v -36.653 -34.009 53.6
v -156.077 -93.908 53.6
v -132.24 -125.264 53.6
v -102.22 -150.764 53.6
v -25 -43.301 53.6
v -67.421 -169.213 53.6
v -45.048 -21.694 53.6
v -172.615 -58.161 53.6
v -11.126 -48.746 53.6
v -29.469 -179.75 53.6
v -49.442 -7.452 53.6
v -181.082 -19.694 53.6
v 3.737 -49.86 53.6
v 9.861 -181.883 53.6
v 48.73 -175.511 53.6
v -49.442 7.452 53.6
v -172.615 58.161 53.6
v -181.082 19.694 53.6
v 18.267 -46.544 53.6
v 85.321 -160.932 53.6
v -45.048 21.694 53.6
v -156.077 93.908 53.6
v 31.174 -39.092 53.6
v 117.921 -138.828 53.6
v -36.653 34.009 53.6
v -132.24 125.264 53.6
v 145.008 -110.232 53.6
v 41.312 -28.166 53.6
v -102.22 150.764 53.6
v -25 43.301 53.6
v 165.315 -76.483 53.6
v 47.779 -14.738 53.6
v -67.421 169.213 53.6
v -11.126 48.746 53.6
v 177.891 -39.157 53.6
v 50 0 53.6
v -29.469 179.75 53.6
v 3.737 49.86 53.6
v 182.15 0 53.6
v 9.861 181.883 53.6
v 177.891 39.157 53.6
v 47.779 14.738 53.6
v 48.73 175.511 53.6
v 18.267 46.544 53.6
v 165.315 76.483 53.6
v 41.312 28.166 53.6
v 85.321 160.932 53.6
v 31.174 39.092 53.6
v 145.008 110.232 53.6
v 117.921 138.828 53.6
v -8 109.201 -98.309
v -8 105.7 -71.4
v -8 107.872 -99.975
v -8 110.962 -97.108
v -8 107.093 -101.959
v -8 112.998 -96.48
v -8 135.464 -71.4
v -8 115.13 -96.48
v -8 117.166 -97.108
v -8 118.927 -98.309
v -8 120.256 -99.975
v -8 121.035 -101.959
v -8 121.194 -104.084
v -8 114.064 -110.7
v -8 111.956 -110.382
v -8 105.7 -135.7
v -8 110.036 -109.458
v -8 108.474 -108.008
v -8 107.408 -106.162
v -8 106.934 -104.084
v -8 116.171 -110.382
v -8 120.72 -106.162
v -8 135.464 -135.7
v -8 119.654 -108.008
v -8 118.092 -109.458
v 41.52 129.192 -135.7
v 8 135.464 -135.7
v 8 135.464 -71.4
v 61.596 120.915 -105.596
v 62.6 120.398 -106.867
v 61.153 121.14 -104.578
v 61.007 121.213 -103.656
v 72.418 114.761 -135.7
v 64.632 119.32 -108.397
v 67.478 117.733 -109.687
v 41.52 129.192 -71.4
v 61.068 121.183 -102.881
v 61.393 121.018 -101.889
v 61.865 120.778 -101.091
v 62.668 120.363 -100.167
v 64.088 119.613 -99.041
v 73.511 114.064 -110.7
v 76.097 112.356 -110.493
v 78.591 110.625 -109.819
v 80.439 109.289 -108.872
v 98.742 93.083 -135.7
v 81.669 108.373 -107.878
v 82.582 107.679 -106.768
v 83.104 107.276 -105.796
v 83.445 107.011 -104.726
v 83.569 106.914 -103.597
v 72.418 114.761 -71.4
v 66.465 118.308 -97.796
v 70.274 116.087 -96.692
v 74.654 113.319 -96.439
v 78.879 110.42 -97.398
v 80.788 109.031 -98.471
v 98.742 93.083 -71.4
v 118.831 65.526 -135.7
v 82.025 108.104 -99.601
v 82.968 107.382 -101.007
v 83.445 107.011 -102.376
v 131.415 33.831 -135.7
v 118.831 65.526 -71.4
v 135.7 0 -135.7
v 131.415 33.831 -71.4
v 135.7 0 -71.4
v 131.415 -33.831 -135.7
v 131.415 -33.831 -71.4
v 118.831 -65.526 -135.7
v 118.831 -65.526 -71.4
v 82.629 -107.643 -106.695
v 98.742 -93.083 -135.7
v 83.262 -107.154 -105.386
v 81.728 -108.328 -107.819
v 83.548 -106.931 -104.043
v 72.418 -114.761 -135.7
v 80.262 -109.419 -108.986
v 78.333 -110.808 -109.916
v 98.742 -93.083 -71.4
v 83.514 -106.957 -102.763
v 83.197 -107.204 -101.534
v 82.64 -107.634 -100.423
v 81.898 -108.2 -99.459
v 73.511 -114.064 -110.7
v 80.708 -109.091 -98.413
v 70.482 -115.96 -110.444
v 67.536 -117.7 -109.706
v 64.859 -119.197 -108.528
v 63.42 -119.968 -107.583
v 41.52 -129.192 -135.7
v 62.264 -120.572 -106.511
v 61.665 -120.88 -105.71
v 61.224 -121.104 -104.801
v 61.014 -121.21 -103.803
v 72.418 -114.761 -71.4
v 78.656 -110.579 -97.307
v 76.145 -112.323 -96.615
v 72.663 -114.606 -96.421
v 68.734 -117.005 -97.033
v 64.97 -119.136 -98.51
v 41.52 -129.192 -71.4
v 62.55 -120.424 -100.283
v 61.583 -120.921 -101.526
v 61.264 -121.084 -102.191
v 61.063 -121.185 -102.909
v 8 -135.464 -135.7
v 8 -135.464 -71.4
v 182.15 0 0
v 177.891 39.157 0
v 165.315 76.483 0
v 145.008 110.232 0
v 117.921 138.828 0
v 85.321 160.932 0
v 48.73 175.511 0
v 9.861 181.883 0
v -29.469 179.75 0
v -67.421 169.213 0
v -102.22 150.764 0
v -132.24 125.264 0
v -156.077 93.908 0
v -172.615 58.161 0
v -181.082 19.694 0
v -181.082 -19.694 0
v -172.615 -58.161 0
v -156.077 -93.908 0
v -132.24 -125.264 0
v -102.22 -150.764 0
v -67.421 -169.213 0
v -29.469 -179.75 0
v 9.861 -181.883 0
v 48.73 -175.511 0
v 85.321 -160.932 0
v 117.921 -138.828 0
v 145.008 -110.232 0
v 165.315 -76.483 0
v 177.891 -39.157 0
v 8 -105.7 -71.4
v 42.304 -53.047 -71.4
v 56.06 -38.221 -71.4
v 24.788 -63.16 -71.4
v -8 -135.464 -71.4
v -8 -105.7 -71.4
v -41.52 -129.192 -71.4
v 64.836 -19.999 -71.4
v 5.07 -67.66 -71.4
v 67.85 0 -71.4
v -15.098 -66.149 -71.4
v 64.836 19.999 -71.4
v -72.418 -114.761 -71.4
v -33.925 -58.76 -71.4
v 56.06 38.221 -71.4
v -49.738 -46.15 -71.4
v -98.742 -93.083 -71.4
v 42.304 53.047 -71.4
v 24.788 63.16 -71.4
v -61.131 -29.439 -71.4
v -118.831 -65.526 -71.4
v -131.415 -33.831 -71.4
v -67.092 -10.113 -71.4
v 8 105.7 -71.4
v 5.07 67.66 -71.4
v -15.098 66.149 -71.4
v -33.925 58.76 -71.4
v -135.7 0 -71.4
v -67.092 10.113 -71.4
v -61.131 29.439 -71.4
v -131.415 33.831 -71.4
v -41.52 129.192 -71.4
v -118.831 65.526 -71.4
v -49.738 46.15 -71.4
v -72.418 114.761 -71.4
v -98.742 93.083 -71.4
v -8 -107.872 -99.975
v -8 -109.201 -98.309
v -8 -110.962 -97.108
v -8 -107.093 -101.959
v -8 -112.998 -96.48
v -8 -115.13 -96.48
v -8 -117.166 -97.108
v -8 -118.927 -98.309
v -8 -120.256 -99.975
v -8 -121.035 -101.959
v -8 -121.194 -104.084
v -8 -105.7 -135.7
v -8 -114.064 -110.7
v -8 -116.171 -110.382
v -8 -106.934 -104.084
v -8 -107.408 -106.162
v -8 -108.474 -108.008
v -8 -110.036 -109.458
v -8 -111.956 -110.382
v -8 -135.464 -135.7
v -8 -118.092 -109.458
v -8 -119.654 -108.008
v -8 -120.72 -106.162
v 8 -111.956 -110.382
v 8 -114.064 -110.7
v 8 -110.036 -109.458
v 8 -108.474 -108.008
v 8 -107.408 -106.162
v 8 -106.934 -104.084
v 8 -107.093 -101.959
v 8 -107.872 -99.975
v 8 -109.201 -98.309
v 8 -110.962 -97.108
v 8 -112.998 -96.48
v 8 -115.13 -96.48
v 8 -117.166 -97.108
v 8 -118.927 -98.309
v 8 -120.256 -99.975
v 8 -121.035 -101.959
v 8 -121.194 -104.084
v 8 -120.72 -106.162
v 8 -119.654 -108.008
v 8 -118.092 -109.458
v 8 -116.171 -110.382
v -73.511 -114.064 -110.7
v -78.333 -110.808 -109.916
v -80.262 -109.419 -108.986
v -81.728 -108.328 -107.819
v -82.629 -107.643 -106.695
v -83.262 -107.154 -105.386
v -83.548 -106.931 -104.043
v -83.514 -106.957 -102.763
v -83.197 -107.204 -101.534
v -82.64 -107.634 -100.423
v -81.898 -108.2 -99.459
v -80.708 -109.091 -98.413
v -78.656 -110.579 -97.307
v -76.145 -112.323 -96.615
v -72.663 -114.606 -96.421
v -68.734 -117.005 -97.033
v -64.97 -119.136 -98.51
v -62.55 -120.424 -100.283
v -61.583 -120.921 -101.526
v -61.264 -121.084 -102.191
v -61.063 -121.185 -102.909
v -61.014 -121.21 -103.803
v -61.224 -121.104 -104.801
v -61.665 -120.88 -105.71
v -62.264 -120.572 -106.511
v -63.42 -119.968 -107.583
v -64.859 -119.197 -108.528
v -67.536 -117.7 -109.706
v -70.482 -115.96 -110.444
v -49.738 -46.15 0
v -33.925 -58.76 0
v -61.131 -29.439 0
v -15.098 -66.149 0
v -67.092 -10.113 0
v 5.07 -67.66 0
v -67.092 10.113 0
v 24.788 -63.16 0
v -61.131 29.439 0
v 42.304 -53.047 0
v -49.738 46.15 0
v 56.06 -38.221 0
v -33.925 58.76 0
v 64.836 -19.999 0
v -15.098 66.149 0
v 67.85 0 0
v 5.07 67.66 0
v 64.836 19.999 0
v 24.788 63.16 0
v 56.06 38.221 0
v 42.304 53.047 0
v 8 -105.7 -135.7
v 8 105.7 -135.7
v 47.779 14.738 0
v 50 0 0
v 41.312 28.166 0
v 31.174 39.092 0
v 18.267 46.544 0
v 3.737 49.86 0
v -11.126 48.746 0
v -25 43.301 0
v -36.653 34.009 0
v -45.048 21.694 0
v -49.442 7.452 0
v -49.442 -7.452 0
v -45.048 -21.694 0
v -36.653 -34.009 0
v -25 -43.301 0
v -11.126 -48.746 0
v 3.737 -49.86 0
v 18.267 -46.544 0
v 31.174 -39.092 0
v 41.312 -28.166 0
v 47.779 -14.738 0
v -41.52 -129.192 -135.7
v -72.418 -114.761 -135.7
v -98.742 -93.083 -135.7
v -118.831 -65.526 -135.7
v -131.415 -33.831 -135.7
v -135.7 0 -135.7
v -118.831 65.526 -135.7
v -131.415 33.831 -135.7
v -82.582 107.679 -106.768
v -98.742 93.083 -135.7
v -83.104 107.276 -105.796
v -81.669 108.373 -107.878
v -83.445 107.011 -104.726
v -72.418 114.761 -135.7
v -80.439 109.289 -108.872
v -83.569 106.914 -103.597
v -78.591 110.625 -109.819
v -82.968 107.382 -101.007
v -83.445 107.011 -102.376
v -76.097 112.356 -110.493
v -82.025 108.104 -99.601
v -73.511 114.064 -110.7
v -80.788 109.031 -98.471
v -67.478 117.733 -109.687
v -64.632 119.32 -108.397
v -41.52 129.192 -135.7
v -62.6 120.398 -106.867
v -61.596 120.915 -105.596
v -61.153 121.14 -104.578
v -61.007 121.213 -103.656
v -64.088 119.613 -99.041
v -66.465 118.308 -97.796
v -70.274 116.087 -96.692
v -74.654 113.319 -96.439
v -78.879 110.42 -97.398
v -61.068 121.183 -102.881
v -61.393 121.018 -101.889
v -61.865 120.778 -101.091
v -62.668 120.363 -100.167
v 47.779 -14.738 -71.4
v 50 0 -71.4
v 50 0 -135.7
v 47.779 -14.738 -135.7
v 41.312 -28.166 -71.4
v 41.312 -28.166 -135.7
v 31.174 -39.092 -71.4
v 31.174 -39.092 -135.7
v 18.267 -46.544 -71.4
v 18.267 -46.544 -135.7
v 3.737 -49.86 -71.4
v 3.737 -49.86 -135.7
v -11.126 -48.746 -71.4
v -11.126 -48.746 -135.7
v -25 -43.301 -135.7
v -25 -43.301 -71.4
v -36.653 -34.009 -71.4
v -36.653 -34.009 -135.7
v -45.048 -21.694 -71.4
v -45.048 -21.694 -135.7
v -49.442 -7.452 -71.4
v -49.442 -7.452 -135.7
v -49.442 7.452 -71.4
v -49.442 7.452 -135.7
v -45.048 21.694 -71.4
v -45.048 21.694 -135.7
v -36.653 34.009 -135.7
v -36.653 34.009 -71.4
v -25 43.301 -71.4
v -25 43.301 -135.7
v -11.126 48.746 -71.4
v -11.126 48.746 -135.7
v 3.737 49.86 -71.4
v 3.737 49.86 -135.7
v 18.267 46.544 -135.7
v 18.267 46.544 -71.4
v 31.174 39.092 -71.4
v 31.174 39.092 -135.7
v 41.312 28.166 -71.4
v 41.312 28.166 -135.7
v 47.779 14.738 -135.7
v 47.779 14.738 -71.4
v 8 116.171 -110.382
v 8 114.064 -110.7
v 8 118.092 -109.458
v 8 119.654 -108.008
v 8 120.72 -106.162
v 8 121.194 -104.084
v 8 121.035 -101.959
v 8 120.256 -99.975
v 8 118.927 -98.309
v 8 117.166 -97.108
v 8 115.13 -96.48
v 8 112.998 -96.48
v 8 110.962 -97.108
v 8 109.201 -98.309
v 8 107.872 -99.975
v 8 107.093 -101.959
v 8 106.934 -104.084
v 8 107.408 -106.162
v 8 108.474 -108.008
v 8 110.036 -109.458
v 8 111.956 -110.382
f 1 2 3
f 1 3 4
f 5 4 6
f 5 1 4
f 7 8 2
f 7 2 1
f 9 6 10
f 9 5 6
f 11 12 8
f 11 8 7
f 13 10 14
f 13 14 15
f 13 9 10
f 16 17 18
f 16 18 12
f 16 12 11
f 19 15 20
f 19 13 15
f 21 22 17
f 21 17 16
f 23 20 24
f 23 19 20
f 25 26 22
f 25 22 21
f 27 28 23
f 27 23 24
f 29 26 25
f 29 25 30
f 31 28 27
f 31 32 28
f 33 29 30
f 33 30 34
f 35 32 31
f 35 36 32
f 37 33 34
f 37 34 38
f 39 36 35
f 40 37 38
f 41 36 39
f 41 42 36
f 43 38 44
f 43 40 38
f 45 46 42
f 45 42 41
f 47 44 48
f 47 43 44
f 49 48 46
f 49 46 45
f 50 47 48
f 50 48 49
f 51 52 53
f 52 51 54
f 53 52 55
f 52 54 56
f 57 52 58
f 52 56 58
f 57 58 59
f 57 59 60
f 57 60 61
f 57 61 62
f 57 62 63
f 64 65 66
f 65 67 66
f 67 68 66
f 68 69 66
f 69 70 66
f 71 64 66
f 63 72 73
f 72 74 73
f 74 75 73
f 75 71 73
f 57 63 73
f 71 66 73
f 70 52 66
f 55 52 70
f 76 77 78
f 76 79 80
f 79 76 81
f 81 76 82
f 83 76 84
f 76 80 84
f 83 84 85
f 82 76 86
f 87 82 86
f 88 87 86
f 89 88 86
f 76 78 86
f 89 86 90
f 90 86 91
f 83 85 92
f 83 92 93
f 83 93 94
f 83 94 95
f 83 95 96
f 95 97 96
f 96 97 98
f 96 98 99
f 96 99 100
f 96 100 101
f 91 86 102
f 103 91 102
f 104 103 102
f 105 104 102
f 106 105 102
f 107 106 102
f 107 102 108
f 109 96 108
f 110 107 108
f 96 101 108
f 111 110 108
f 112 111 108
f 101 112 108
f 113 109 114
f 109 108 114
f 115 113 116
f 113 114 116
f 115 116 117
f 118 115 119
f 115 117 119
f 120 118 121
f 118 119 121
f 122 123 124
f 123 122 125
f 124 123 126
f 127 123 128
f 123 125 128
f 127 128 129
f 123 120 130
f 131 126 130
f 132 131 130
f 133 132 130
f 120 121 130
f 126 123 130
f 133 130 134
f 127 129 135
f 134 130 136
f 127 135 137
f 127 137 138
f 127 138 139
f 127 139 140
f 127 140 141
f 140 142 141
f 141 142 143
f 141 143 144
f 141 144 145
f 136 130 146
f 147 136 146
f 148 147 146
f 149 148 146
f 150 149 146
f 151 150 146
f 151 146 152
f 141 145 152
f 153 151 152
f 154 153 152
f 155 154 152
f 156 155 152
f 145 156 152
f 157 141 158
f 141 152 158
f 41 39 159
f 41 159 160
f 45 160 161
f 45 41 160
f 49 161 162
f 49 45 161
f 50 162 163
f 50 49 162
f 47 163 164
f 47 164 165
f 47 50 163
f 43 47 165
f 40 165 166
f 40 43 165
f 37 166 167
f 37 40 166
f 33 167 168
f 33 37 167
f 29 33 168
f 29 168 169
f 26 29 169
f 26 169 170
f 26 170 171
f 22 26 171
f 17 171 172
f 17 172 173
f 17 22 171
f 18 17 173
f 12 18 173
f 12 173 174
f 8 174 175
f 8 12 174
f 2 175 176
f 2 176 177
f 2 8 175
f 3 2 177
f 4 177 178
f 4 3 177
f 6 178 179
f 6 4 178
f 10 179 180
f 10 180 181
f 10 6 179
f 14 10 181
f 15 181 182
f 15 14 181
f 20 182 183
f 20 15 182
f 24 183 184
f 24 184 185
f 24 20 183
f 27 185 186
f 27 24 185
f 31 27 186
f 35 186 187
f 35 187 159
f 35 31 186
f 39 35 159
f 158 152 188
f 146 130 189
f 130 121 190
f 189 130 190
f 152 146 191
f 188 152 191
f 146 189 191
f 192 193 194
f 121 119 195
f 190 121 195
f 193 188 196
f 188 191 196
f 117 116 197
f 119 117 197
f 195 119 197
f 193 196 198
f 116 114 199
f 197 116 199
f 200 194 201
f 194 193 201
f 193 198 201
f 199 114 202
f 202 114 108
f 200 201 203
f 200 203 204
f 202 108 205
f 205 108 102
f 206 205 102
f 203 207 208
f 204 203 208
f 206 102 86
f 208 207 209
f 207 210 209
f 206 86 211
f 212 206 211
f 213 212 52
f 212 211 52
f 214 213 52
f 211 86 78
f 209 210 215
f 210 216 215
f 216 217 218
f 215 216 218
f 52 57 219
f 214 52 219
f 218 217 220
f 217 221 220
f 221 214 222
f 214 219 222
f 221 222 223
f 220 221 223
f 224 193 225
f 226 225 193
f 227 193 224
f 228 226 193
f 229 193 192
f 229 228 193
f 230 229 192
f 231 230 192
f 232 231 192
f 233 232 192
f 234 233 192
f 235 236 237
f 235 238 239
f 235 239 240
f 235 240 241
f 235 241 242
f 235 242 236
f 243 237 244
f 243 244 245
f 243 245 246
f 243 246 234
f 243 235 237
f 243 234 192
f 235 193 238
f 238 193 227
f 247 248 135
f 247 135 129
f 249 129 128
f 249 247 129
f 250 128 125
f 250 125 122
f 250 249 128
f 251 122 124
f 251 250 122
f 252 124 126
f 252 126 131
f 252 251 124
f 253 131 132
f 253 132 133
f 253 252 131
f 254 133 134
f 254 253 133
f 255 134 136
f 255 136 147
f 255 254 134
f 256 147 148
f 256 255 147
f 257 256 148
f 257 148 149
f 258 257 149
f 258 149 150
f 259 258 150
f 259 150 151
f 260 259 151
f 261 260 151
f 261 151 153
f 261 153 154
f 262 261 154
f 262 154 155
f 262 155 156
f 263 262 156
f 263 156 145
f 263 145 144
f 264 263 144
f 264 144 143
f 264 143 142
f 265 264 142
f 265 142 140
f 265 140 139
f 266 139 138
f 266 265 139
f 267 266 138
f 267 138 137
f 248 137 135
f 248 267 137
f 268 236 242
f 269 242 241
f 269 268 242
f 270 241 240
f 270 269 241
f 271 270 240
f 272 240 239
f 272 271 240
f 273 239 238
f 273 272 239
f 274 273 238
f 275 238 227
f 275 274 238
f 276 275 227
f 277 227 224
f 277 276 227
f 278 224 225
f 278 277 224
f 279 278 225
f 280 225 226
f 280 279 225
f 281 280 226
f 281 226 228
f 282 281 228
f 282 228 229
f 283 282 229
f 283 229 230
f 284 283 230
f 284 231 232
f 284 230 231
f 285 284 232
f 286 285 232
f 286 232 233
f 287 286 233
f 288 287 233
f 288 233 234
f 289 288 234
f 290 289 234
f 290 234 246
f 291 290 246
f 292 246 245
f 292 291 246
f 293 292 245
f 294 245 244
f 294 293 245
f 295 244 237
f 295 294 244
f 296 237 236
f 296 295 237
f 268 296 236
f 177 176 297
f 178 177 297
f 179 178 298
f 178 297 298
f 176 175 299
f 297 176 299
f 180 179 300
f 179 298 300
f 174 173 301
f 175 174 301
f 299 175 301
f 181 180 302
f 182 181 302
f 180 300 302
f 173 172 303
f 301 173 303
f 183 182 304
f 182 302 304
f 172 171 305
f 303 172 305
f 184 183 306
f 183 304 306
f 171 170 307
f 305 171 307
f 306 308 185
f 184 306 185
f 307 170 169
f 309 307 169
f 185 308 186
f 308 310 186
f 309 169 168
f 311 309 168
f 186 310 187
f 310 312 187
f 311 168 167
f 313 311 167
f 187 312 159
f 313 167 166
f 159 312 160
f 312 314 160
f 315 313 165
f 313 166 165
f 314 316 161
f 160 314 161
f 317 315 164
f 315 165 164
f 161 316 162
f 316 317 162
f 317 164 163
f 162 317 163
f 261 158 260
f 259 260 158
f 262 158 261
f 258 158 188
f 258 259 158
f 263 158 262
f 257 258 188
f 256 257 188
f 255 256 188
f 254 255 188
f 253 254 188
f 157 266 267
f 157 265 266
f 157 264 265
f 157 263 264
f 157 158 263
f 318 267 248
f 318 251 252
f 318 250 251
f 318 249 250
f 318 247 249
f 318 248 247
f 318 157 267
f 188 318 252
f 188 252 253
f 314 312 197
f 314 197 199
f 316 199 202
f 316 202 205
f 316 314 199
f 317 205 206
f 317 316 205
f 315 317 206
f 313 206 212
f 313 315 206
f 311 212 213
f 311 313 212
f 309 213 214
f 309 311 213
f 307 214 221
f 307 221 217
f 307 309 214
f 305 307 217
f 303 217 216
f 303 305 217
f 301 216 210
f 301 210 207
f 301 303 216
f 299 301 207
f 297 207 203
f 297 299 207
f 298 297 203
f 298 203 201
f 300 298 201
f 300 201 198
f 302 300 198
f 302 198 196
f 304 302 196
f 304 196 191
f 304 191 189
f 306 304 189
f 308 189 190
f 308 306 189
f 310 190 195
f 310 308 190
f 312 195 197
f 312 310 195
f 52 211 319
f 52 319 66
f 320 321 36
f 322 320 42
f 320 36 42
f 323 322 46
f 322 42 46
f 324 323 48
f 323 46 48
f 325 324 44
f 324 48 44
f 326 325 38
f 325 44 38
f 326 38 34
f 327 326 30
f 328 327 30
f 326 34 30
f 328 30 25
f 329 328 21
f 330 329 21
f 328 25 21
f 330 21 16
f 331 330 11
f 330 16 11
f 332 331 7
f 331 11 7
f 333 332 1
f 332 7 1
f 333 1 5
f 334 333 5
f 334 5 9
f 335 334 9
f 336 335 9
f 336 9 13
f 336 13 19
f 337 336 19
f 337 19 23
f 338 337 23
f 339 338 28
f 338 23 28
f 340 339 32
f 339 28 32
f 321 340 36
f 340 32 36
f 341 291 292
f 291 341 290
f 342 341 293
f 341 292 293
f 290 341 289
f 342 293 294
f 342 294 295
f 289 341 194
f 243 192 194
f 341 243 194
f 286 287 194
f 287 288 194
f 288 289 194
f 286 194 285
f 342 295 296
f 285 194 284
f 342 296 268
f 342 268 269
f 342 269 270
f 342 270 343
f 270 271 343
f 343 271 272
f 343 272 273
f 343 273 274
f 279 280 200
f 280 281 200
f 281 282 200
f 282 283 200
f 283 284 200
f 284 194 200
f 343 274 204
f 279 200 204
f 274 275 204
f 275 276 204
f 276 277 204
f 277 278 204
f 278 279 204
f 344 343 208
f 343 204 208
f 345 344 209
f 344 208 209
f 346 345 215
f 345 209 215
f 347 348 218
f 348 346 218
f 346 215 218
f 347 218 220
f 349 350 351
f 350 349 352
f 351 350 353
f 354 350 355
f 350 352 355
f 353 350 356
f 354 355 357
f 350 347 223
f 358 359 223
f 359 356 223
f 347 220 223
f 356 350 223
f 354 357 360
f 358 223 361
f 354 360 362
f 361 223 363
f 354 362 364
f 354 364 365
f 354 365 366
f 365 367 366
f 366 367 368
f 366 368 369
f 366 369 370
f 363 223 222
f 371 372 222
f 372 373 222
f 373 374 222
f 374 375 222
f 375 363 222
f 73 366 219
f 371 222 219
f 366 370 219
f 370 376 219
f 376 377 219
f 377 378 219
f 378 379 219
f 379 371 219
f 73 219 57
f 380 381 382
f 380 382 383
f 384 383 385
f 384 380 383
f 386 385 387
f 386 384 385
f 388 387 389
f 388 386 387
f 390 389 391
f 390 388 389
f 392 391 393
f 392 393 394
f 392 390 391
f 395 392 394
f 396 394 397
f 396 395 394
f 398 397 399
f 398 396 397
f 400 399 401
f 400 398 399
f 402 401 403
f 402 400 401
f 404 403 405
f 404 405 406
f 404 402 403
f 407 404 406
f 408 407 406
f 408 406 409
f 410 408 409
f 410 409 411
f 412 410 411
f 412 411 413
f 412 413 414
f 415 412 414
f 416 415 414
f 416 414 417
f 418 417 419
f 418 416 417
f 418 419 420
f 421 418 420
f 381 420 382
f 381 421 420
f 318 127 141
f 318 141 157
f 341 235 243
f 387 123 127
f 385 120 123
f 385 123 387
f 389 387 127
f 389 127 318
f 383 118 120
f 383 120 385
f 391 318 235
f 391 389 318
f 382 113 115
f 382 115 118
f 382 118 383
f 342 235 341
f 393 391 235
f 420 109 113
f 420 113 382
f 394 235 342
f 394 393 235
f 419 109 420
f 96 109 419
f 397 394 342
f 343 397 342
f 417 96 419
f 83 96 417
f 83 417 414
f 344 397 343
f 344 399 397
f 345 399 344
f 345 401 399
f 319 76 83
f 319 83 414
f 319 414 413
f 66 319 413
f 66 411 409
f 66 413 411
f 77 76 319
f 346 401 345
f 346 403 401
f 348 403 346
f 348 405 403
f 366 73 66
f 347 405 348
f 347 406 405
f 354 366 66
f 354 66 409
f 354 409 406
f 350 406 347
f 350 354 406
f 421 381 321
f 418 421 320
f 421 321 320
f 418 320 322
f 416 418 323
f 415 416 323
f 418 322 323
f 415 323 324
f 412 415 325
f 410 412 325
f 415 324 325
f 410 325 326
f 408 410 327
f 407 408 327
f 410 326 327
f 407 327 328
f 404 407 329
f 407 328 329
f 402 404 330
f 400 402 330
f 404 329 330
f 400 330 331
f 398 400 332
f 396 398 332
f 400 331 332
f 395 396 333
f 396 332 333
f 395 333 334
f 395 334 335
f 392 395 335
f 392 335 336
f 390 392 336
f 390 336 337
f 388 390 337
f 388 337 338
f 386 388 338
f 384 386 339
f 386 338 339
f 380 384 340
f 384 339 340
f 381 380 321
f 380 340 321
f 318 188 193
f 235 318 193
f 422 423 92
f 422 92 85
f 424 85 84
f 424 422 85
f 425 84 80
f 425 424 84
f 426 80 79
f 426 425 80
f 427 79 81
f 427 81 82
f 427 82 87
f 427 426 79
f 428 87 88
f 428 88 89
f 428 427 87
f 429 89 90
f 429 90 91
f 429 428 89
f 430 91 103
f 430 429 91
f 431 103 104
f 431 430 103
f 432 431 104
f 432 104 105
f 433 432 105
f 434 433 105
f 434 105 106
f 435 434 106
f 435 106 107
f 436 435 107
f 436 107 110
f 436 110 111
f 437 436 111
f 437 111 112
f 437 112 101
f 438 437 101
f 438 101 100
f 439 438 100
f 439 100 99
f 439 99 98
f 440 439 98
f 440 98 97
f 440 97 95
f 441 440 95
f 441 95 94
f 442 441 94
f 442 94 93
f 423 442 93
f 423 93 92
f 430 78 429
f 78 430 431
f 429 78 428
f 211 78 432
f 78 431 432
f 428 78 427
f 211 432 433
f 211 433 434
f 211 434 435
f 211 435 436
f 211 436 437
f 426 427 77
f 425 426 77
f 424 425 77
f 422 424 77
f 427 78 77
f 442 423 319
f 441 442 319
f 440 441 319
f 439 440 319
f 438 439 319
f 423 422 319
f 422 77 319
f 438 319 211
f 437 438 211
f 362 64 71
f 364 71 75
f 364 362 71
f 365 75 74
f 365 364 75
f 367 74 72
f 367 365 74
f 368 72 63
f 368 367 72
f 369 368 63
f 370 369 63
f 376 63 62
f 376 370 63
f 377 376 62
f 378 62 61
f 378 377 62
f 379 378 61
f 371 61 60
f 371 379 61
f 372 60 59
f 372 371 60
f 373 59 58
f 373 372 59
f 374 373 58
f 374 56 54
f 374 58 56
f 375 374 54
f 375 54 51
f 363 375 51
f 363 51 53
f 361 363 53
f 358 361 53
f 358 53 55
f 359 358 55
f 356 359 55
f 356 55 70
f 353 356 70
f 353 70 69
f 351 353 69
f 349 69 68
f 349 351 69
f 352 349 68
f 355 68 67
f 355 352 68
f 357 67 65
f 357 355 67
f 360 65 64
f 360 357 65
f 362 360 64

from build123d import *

# Parameters (mm, degrees)
ESQUISSE1_R                  = 67.85
ESQUISSE1_R_2                = 50
BOSS_EXTRU_1_DEPTH           = 71.4
ESQUISSE3_R                  = 135.7
ESQUISSE3_R_2                = 50
BOSS_EXTRU_2_DEPTH           = 64.3
ENL_V_MAT_EXTRU_2_DEPTH      = 236.039294587
ENL_V_MAT_EXTRU_3_DEPTH      = 235.903107685
ENL_V_MAT_EXTRU_3_DEPTH_BACK = 235.903107685
ESQUISSE7_R                  = 7.15
BOSS_EXTRU_3_START           = 53.6
ESQUISSE8_R                  = 182.15
ESQUISSE8_R_2                = 50
BOSS_EXTRU_3_DEPTH           = 53.6


with BuildPart() as part:
    # Esquisse1 → Boss.-Extru.1 (new body)
    with BuildSketch(Plane.XY):
        Circle(ESQUISSE1_R)
        Circle(ESQUISSE1_R_2, mode=Mode.SUBTRACT)
    extrude(amount=-BOSS_EXTRU_1_DEPTH)

    # Esquisse3 → Boss.-Extru.2 (add)
    with BuildSketch(Plane(origin=(0, 0, -71.4), x_dir=(-1, 0, 0), z_dir=(0, 0, -1))):
        Circle(ESQUISSE3_R)
        with Locations(Location((0, 0, 0), (0, 0, 180))):
            Circle(ESQUISSE3_R_2, mode=Mode.SUBTRACT)
    extrude(amount=BOSS_EXTRU_2_DEPTH)

    # Esquisse6 → Enlèv. mat.-Extru.2 (cut, through all)
    with BuildSketch(Plane(origin=(0, 0, -135.7), x_dir=(-1, 0, 0), z_dir=(0, 0, -1))):
        with BuildLine():
            Line((-8, 105.7), (8, 105.7))
            Line((8, 105.7), (8, 135.463980452))
            ThreePointArc((8, 135.463980452), (0, 135.7), (-8, 135.463980452))
            Line((-8, 135.463980452), (-8, 105.7))
        make_face()
        with BuildLine():
            Line((8, -105.7), (8, -135.463980452))
            ThreePointArc((8, -135.463980452), (0, -135.7), (-8, -135.463980452))
            Line((-8, -135.463980452), (-8, -105.7))
            Line((-8, -105.7), (8, -105.7))
        make_face()
    extrude(amount=-ENL_V_MAT_EXTRU_2_DEPTH, mode=Mode.SUBTRACT)

    # Esquisse7 → Enlèv. mat.-Extru.3 (cut, two sides: drawn at the far end of the back side and taken through both)
    with BuildSketch(Plane(origin=(0, 0, 0), x_dir=(0, 0, -1), z_dir=(1, 0, 0)).offset(-ENL_V_MAT_EXTRU_3_DEPTH_BACK)):
        with Locations((103.55, 114.063980452)):
            Circle(ESQUISSE7_R)
        with Locations((103.55, -114.063980452)):
            Circle(ESQUISSE7_R)
    extrude(amount=ENL_V_MAT_EXTRU_3_DEPTH + ENL_V_MAT_EXTRU_3_DEPTH_BACK, mode=Mode.SUBTRACT)

    # Esquisse8 → Boss.-Extru.3 (add)
    with BuildSketch(Plane.XY.offset(BOSS_EXTRU_3_START)):
        Circle(ESQUISSE8_R)
        Circle(ESQUISSE8_R_2, mode=Mode.SUBTRACT)
    extrude(amount=-BOSS_EXTRU_3_DEPTH)


solid = part.part
